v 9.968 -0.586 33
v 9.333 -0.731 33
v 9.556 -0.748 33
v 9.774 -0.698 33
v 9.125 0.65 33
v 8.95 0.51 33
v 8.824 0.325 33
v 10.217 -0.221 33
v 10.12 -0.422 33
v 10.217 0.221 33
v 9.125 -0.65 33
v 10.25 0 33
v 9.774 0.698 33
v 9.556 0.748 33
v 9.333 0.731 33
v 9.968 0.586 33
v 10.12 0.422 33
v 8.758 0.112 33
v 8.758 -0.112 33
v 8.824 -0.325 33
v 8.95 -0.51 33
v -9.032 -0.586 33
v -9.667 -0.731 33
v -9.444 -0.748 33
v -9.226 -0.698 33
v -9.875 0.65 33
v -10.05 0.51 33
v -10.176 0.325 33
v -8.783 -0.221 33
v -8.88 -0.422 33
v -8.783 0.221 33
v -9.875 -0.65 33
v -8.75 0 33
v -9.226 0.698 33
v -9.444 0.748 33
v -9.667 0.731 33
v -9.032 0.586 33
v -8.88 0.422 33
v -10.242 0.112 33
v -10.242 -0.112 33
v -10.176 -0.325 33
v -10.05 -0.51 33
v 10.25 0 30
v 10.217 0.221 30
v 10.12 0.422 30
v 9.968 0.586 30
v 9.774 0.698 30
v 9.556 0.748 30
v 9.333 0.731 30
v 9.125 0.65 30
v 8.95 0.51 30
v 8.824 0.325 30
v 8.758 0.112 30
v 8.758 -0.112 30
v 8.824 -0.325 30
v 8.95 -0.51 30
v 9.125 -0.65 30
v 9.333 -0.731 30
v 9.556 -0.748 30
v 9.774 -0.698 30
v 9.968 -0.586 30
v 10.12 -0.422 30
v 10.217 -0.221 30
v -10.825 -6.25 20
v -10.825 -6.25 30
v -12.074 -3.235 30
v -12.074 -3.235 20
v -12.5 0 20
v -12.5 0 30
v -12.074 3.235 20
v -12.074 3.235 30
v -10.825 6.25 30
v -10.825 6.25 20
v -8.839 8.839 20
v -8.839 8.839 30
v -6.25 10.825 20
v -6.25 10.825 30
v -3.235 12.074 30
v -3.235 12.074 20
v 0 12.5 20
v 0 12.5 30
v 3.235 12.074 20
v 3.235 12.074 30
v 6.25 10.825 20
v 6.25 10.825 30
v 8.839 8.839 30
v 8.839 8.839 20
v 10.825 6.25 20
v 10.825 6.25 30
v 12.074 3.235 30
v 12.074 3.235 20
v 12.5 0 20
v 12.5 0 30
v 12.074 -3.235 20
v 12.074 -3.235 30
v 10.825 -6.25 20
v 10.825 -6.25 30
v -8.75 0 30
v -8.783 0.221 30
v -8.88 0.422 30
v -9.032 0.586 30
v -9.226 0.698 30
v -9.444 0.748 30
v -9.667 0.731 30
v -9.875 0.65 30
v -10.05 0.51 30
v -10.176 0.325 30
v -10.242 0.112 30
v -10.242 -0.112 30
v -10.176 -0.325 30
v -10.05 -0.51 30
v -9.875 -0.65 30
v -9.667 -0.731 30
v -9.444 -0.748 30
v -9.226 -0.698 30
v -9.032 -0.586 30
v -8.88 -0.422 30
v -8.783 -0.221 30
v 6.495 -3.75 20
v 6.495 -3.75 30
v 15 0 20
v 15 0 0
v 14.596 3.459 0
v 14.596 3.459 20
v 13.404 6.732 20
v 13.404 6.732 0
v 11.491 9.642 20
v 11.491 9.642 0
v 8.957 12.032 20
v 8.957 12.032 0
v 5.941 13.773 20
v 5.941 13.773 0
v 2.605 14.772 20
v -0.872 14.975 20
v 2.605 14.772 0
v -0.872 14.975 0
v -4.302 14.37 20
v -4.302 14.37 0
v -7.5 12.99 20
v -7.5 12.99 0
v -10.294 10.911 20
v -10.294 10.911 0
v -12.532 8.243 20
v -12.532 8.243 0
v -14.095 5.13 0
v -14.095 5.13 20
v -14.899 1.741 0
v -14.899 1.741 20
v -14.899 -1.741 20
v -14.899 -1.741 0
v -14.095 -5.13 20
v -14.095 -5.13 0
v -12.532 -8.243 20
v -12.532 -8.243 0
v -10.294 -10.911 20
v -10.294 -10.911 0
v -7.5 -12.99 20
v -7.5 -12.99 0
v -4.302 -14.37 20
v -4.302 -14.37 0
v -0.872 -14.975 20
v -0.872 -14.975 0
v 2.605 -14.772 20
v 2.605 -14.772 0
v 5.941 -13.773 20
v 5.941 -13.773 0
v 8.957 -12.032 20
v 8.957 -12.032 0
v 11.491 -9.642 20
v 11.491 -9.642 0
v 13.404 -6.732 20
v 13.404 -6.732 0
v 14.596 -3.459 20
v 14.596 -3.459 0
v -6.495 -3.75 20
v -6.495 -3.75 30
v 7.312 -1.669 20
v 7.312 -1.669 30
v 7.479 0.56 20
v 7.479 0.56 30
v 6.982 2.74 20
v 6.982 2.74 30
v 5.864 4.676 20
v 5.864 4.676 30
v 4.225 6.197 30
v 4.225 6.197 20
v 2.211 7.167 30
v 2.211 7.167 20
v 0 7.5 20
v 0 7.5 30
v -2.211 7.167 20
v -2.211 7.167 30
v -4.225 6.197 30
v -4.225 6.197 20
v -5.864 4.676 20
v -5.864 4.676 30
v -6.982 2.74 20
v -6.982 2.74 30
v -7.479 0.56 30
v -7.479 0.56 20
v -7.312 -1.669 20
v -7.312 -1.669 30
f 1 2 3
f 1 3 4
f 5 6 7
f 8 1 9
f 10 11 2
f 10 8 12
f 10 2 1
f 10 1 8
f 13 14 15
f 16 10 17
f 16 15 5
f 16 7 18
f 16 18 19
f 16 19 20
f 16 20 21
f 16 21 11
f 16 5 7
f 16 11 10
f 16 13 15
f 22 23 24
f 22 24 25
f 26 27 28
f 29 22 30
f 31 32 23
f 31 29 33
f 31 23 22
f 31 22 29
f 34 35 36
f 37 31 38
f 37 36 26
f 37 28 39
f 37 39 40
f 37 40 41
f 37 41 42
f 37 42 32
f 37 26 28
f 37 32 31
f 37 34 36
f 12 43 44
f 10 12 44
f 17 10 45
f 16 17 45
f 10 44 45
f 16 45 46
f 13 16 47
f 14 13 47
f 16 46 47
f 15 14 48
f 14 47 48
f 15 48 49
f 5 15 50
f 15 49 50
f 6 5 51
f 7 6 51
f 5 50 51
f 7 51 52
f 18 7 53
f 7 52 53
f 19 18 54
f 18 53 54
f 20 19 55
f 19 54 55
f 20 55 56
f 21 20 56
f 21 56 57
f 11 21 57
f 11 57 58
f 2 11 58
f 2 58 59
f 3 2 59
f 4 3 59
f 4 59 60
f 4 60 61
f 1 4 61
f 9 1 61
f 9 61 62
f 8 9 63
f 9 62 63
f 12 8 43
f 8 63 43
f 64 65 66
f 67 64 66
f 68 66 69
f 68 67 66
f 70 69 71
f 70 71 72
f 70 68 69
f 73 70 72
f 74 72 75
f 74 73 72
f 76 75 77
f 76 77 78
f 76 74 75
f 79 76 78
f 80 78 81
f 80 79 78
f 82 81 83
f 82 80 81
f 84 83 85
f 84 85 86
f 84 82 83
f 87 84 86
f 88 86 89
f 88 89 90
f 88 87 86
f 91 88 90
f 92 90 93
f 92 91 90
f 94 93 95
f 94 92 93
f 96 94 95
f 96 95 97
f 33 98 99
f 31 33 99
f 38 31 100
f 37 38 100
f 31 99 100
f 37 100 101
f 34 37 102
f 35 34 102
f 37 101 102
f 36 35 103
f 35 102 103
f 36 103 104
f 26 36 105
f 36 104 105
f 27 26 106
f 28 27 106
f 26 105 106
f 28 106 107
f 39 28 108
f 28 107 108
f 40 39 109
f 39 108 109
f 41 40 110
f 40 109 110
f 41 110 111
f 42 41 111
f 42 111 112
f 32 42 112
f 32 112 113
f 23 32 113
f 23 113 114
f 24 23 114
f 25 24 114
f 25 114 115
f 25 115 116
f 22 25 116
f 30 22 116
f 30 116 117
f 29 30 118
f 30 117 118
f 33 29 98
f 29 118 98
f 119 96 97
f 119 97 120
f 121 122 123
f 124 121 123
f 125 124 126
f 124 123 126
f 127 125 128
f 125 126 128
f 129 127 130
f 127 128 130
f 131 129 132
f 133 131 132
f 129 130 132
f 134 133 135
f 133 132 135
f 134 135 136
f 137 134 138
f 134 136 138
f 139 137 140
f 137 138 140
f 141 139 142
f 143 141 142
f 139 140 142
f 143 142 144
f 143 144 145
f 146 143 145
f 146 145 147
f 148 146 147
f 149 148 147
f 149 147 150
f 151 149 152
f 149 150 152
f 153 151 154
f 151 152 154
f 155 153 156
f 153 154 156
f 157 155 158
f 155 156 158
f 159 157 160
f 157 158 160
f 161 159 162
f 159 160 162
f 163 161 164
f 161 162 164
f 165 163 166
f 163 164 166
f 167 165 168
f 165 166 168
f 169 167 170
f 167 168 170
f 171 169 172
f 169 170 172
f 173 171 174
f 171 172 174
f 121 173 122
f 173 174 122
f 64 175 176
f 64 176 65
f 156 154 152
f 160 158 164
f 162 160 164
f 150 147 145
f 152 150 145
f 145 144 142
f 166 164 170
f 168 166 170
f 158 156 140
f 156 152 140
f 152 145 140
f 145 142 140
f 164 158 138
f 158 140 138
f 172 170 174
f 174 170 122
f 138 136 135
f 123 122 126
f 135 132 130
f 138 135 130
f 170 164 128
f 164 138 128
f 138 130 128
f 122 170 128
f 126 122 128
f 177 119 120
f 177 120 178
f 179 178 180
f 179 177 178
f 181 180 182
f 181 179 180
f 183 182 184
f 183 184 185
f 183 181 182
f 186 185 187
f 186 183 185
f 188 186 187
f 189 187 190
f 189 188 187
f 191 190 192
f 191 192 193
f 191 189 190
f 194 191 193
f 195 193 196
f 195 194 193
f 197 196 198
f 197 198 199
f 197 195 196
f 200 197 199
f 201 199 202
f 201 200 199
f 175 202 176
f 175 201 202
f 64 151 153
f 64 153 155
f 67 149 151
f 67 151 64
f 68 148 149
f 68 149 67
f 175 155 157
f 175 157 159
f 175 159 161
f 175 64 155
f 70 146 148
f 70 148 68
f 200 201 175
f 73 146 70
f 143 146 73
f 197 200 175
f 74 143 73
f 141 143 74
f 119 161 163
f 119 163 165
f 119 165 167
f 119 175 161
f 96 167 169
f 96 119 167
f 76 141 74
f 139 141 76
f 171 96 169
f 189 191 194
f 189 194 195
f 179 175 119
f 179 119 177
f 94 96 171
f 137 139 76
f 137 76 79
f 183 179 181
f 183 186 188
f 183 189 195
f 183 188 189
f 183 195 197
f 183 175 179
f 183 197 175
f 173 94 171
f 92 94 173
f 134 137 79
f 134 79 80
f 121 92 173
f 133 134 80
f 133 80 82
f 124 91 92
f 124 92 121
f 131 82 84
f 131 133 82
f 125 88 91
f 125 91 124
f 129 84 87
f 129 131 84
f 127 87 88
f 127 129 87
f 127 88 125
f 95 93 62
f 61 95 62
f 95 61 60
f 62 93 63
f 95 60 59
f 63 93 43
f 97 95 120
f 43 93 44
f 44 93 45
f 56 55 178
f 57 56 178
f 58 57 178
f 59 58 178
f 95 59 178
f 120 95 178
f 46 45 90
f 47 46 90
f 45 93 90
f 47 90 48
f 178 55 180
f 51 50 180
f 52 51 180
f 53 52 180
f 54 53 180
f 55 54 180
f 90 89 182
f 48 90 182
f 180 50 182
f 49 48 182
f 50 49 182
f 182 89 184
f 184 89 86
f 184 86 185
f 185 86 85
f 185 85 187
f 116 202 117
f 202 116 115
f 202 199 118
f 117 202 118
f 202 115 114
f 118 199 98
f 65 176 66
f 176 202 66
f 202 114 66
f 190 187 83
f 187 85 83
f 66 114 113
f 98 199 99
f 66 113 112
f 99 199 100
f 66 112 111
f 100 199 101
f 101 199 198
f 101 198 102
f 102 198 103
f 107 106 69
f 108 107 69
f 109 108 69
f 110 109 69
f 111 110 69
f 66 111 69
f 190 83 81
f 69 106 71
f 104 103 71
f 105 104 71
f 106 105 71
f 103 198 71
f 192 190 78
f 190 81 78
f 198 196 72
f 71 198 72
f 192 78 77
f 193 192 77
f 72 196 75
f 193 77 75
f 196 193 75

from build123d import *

# Parameters (mm, degrees)
SKETCH1_R           = 15
BOSS_EXTRUDE1_DEPTH = 20
BOSS_EXTRUDE2_DEPTH = 10
SKETCH3_R           = 0.75
BOSS_EXTRUDE3_DEPTH = 3


with BuildPart() as part:
    # Sketch1 → Boss-Extrude1 (new body)
    with BuildSketch(Plane.XY):
        Circle(SKETCH1_R)
    extrude(amount=BOSS_EXTRUDE1_DEPTH)

    # Sketch2 → Boss-Extrude2 (add)
    with BuildSketch(Plane.XY.offset(20)):
        with BuildLine():
            Line((-6.495190528, -3.75), (-10.825317547, -6.25))
            ThreePointArc((-10.825317547, -6.25), (0, 12.5), (10.825317547, -6.25))
            Line((10.825317547, -6.25), (6.495190528, -3.75))
            ThreePointArc((6.495190528, -3.75), (0, 7.5), (-6.495190528, -3.75))
        make_face()
    extrude(amount=BOSS_EXTRUDE2_DEPTH)

    # Sketch3 → Boss-Extrude3 (add)
    with BuildSketch(Plane.XY.offset(30)):
        with Locations((9.5, 0)):
            Circle(SKETCH3_R)
        with Locations((-9.5, 0)):
            Circle(SKETCH3_R)
    extrude(amount=BOSS_EXTRUDE3_DEPTH)


solid = part.part
